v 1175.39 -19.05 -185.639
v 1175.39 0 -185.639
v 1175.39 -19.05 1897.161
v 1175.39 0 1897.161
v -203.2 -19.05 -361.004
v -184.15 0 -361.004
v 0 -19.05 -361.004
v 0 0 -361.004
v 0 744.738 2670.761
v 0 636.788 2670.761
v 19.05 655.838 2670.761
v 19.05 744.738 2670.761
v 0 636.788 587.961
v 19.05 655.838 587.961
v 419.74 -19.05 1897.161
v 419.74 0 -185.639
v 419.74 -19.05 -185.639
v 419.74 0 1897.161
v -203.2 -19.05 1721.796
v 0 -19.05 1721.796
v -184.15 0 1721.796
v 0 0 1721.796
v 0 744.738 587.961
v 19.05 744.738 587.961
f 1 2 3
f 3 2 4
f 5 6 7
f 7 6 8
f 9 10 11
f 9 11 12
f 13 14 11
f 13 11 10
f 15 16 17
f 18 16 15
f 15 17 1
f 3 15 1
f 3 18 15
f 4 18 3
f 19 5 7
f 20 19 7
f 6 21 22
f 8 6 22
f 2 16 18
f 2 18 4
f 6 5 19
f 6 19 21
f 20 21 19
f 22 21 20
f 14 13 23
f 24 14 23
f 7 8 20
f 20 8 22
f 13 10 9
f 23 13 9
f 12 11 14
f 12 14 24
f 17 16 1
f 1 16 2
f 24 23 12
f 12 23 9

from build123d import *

# Parameters (mm, degrees)
F0_W     = 203.2
F0_H     = 2082.8
F1_DEPTH = 19.05
F3_DEPTH = 2082.8
F4_W     = 755.65
F4_H     = 2082.8
F5_DEPTH = 19.05
F6_W     = 107.95
F6_H     = 2082.8
F7_DEPTH = 19.05
F9_DEPTH = 2082.8


with BuildPart() as f1:
    # F0 (on Front) → F1 (new body)
    with BuildSketch(Plane.XZ):
        with Locations((-101.6, 680.395788)):
            Rectangle(F0_W, F0_H)
    extrude(amount=F1_DEPTH)

    # F2 (on face) → F3 (cut)
    with BuildSketch(Plane.XY.offset(1721.795788)):
        Polygon((-203.2, 0), (-203.2, -19.05), (-184.15, 0), align=None)
    extrude(amount=-F3_DEPTH, mode=Mode.SUBTRACT)


with BuildPart() as f5:
    # F4 (on Front) → F5 (new body)
    with BuildSketch(Plane.XZ):
        with Locations((797.56523, 855.760932)):
            Rectangle(F4_W, F4_H)
    extrude(amount=F5_DEPTH)


with BuildPart() as f7:
    # F6 (on Right) → F7 (new body)
    with BuildSketch(Plane.YZ):
        with Locations((690.763086, 1629.361022)):
            Rectangle(F6_W, F6_H)
    extrude(amount=F7_DEPTH)

    # F8 (on face) → F9 (cut)
    with BuildSketch(Plane.XY.offset(2670.761022)):
        Polygon((19.05, 636.788086), (19.05, 655.838086), (0, 636.788086), align=None)
    extrude(amount=-F9_DEPTH, mode=Mode.SUBTRACT)


solid = Compound([f1.part, f5.part, f7.part])
